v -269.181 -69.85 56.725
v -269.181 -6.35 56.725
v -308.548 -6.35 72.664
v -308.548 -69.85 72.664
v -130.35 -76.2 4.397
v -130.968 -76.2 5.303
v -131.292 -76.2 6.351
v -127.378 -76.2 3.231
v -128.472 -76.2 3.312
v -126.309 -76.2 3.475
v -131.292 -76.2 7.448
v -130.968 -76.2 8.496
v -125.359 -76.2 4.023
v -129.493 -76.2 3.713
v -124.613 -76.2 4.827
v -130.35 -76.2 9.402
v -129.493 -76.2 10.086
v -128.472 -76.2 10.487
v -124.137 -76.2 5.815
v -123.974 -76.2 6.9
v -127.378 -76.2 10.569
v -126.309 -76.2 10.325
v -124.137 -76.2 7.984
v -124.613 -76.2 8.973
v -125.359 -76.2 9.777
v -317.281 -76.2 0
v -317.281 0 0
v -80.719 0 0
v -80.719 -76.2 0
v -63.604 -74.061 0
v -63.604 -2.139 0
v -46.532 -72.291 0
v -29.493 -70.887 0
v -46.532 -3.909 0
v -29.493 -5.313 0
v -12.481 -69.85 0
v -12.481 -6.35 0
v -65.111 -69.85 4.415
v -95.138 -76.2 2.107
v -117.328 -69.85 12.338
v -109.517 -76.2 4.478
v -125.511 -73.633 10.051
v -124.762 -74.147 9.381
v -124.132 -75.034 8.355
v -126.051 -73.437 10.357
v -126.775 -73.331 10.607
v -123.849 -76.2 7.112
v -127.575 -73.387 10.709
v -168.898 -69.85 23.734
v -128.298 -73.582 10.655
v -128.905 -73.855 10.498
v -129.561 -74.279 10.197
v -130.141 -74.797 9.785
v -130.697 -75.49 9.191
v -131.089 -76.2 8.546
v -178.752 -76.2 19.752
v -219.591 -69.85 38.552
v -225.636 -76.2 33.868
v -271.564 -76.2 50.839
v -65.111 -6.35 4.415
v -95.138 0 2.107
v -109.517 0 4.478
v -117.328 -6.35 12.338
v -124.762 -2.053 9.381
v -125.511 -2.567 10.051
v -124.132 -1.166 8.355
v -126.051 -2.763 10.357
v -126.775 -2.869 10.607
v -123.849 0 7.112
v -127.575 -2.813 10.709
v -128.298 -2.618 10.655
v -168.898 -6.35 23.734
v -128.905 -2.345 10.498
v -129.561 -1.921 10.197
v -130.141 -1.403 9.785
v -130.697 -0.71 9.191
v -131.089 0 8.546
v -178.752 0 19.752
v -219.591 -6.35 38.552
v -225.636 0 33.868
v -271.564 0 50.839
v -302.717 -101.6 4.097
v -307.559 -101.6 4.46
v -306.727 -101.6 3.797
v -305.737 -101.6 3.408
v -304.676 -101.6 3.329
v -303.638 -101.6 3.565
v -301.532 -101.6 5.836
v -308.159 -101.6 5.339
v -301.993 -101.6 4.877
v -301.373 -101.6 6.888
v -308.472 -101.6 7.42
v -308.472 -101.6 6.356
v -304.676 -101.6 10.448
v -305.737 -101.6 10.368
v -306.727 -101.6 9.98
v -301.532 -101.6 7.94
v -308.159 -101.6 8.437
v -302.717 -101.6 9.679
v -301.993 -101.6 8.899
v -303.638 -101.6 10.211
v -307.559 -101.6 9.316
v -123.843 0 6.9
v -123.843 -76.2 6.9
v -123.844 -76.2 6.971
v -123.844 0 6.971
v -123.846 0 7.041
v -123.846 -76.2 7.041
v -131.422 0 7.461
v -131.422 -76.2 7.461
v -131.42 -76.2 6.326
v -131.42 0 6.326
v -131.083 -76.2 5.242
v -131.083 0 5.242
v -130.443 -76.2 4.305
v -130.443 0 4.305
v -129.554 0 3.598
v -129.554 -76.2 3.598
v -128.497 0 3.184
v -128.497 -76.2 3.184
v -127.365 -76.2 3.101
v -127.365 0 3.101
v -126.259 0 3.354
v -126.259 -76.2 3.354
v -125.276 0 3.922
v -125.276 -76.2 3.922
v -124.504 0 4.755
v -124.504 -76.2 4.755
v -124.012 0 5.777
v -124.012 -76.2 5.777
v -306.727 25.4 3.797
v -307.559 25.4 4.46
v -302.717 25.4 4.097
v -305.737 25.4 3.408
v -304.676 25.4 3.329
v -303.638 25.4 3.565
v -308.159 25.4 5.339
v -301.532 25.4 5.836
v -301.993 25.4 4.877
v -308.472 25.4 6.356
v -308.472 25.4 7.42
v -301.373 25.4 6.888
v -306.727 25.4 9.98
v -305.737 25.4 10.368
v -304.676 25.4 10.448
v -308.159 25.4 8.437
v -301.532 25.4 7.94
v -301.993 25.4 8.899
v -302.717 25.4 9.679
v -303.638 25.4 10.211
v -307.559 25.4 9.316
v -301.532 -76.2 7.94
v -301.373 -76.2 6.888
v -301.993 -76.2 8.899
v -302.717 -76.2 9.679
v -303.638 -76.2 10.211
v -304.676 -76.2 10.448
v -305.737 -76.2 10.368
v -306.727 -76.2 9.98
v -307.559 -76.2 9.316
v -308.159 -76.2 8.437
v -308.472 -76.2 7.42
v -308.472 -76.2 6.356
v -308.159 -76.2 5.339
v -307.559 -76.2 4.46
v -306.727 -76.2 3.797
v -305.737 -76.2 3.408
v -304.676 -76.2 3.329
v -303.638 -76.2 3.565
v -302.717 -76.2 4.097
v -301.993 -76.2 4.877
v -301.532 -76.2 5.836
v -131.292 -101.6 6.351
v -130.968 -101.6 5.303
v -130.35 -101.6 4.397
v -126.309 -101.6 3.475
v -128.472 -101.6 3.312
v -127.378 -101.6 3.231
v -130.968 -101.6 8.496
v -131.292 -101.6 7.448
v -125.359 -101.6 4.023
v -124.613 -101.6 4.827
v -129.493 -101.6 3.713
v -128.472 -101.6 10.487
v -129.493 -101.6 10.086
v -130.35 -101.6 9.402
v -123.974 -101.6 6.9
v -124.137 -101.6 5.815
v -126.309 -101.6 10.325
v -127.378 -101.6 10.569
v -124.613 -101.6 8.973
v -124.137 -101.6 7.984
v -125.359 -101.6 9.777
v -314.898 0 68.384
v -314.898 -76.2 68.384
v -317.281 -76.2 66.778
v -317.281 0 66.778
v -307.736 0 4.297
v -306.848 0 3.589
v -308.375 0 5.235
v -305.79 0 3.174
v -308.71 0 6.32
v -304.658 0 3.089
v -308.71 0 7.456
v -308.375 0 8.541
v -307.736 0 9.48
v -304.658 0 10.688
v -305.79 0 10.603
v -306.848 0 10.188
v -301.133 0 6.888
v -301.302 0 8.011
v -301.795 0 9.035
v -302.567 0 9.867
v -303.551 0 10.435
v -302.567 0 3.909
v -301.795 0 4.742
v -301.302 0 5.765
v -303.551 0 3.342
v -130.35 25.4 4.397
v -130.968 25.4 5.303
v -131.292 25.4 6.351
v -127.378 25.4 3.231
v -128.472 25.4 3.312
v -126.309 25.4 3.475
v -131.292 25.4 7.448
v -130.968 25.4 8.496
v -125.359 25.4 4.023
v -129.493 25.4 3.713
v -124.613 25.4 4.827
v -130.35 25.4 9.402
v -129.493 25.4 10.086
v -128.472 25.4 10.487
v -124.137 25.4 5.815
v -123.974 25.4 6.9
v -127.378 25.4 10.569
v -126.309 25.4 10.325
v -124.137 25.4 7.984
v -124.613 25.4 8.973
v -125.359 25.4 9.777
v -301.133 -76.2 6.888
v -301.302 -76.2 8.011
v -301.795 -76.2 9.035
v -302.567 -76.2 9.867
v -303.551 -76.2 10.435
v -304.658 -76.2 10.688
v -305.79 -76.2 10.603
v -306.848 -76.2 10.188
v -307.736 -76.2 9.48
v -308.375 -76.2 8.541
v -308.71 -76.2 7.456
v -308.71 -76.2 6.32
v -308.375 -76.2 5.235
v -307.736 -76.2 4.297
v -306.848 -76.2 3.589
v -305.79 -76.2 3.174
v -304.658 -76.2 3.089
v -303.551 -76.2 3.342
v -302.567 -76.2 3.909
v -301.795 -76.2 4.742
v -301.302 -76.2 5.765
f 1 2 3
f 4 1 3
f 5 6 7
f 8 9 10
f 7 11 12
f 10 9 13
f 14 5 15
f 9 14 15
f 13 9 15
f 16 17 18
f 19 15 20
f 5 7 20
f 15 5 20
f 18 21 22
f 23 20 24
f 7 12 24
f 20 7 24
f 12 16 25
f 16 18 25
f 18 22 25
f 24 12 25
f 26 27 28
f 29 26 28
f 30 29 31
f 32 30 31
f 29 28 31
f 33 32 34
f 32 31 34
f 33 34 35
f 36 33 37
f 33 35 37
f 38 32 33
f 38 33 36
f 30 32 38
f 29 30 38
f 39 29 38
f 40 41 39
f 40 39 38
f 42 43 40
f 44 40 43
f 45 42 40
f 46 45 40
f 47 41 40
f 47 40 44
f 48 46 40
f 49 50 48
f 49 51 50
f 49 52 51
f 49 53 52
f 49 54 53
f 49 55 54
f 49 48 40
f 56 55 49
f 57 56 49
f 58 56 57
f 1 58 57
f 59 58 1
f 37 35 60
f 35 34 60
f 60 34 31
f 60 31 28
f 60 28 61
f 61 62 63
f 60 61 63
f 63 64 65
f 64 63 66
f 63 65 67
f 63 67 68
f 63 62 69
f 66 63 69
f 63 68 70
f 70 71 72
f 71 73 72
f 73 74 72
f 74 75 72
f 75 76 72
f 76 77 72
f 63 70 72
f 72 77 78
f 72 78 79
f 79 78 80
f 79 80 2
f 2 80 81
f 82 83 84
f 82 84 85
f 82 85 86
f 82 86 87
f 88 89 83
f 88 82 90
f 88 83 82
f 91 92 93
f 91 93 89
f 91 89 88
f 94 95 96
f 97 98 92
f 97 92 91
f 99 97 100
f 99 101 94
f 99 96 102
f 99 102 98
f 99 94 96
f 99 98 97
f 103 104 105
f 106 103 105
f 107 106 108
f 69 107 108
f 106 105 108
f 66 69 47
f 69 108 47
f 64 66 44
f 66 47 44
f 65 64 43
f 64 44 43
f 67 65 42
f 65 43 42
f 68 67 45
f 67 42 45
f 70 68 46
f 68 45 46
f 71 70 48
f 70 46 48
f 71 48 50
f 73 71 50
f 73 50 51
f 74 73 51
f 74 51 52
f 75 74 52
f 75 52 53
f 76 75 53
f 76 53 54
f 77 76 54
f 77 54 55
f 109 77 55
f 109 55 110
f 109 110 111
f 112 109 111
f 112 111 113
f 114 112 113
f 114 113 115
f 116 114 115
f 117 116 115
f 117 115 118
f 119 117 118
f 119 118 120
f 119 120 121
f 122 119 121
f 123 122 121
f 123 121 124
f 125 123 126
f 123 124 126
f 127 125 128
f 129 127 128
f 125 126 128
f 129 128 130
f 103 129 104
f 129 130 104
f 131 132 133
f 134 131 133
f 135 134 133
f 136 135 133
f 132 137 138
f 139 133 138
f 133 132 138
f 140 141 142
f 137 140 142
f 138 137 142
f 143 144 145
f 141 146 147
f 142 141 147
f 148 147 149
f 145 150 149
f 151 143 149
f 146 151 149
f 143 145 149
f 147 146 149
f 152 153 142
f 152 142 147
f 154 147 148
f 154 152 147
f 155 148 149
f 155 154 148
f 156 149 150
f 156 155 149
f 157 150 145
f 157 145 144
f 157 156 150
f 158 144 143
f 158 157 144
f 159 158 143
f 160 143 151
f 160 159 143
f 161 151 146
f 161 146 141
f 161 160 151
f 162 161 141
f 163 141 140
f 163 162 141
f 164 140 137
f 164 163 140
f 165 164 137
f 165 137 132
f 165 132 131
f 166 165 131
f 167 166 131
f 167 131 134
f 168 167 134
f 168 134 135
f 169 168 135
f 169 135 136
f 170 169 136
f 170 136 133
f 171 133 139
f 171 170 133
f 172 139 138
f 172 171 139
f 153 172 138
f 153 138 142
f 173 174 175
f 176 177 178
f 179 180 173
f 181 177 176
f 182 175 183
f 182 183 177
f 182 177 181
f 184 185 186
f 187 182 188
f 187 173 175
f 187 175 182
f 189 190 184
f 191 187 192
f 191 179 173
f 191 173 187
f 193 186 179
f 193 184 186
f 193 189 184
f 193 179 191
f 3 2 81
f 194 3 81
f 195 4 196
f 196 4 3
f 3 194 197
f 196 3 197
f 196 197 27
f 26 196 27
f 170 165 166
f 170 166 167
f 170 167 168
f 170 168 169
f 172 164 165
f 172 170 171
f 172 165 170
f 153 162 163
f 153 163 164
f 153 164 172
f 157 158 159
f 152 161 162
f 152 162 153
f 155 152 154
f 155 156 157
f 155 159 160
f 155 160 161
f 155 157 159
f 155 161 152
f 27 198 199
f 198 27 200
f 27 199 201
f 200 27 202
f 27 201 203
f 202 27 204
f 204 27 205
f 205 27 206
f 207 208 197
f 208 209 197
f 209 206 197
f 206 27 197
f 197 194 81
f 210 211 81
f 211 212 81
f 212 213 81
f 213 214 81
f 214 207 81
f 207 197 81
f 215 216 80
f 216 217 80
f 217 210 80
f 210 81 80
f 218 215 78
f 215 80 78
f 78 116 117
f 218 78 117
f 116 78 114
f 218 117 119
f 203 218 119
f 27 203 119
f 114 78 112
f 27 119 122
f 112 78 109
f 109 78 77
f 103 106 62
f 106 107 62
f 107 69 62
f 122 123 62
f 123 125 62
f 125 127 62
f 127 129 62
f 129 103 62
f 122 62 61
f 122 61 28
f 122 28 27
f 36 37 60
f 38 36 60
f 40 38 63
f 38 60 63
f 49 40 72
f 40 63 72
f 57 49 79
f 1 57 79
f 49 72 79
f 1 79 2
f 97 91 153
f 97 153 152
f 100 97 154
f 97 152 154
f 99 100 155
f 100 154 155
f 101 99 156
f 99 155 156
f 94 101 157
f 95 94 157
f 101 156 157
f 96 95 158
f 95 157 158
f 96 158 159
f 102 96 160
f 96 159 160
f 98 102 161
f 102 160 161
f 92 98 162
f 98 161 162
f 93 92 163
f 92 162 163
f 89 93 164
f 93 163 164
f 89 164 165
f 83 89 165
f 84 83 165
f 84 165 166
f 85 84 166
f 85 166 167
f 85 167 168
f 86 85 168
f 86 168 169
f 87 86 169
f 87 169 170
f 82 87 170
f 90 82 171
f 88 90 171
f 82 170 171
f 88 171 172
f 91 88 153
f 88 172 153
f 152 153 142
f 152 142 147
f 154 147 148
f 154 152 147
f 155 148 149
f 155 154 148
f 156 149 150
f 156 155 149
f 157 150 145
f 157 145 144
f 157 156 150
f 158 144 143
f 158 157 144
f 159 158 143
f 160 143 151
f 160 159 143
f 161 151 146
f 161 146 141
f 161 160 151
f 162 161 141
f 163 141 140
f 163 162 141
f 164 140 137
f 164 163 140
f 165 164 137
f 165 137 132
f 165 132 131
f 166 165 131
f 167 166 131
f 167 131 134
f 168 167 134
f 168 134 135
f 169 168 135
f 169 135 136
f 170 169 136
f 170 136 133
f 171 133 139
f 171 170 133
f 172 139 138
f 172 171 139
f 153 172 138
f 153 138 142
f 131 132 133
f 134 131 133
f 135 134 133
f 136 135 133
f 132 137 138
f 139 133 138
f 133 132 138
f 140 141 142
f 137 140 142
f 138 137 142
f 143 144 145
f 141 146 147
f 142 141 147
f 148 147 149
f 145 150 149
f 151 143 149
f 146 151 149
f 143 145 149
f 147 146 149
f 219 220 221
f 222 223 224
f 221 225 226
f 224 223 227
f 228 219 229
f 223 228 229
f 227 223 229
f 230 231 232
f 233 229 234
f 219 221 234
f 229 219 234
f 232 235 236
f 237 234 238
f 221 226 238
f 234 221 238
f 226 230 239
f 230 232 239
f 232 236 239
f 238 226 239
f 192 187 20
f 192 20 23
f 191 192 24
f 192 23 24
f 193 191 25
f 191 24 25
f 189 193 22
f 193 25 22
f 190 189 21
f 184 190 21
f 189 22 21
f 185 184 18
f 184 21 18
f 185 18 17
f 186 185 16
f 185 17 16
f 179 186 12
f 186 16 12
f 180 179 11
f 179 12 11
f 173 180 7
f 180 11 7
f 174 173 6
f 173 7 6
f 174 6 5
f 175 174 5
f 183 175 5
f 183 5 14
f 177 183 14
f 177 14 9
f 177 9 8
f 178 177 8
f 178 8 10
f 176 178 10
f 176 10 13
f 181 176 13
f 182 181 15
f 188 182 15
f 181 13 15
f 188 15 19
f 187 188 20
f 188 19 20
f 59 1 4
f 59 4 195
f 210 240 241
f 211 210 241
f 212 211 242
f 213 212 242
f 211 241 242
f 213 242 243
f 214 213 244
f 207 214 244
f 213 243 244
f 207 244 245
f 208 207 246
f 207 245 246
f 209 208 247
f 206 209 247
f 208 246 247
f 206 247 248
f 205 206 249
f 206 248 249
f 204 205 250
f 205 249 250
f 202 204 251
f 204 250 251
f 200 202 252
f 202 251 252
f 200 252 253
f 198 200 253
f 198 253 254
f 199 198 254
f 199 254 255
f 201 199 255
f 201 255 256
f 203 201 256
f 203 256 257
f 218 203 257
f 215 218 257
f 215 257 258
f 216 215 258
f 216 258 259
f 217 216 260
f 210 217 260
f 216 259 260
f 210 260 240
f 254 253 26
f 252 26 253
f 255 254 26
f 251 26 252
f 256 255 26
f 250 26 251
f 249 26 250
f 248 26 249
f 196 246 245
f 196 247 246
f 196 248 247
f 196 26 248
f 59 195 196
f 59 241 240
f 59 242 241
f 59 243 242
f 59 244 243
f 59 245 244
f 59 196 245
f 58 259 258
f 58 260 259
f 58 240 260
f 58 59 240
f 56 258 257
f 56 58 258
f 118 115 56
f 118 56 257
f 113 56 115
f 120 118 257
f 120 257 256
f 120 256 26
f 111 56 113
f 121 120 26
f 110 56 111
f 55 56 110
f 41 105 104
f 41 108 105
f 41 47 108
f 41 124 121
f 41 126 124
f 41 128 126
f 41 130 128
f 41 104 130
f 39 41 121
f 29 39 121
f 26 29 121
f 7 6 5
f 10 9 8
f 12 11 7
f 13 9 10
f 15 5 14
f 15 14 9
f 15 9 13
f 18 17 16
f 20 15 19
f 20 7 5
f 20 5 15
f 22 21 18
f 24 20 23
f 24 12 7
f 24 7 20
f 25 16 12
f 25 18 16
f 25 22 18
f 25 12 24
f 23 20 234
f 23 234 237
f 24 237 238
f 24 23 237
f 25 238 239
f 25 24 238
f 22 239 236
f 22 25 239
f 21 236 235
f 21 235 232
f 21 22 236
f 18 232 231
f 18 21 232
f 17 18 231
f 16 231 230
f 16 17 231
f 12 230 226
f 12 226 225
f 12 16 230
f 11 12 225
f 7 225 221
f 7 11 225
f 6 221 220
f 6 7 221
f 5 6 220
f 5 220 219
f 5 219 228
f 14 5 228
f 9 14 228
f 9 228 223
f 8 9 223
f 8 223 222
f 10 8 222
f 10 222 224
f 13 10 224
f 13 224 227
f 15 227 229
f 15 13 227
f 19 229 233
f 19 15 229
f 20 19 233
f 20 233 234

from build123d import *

# Parameters (mm, degrees)
F1_DEPTH    = 76.2
F2_R        = 3.81
F3_DEPTH    = 76.2
F4_T1_DEPTH = 68.223556095
F4_T3_DEPTH = 124.0305188657
F4_T6_ANGLE = 20.3486989559
F4_T8_ANGLE = 20.3486989559
F5_R        = 3.5695769538
F6_DEPTH    = 101.6
F5_R_2      = 3.6795438925
F6_FACE_R   = 3.5695769538
F7_DEPTH    = 25.4
F8_DEPTH    = 101.6


# Not quite as in the source:
# - a fillet or chamfer that OpenCascade refuses, or shapes differently, is made with other operations: its cross-section is extruded or revolved along the edge and cut away or added


with BuildPart() as f1:
    # F0 (on Front) → F1 (new body)
    with BuildSketch(Plane.XZ):
        with BuildLine():
            Line((-317.2810375895, 0), (-12.4810375895, 0))
            ThreePointArc((-12.4810375895, 0), (-143.2080739486, 17.6048536016), (-269.1808342934, 56.7245744169))
            Line((-269.1808342934, 56.7245744169), (-317.2810375895, 76.2))
            Line((-317.2810375895, 76.2), (-317.2810375895, 0))
        make_face()
    extrude(amount=F1_DEPTH)

    # F2 (on face) → F3 (cut)
    with BuildSketch(Plane.XZ.offset(76.2)):
        with Locations((-304.942605689, 6.888254699)):
            Circle(F2_R)
        with Locations((-127.6531666517, 6.8997577764)):
            Circle(F2_R)
    extrude(amount=-F3_DEPTH, mode=Mode.SUBTRACT)

    # F4: chamfer of 6.35 on 5 edges, made by hand

    # F4_s2 → F4_t1 (cut)
    with BuildSketch(Plane(origin=(-250.9997630926, 0, 101.6279947383), x_dir=(0, 1, 0), z_dir=(-0.9269046144, 0, 0.3752969968))):
        Polygon((-6.35, 48.4444889184), (0, 54.7944889184), (0, 48.4444889184), align=None)
        Polygon((-69.85, 48.4444889184), (-76.2, 54.7944889184), (-76.2, 48.4444889184), align=None)
    extrude(amount=F4_T1_DEPTH, mode=Mode.SUBTRACT)

    # F4_s4 → F4_t3 (cut)
    with BuildSketch(Plane.XZ.offset(-23.9152594329)):
        Polygon((-308.5479016601, 72.6640162152), (-317.2810375895, 66.7781719137), (-317.2810375895, 76.2), align=None)
    extrude(amount=F4_T3_DEPTH, mode=Mode.SUBTRACT)

    # F4_s5 → F4_t6 (revolve, cut)
    with BuildSketch(Plane(origin=(3.8520530857, 0, -0.1139205939), x_dir=(0, 1, 0), z_dir=(0.9995629761, 0, -0.0295610692))):
        Polygon((-69.85, -0.5378053162), (-76.2, -6.8878053162), (-76.2, -0.5378053162), align=None)
    revolve(axis=Axis((27.1796188092, -76.2, 788.6725353144), (0, 1, 0)), revolution_arc=F4_T6_ANGLE, mode=Mode.SUBTRACT)

    # F4_s7 → F4_t8 (revolve, cut)
    with BuildSketch(Plane(origin=(3.8520530857, 0, -0.1139205939), x_dir=(0, 1, 0), z_dir=(0.9995629761, 0, -0.0295610692))):
        Polygon((-6.35, -0.5378053162), (0, -6.8878053162), (0, -0.5378053162), align=None)
    revolve(axis=Axis((27.1796188092, 0, 788.6725353144), (0, 1, 0)), revolution_arc=F4_T8_ANGLE, mode=Mode.SUBTRACT)


with BuildPart() as f6:
    # F5 (on face) → F6 (new body)
    with BuildSketch(Plane.XZ.offset(76.2)):
        with Locations((-304.942605689, 6.888254699)):
            Circle(F5_R)
    extrude(amount=-F6_DEPTH)

    # F5 (on face) + F6_face (on face) → F7 (join)
    with BuildSketch(Plane.XZ.offset(76.2)):
        with Locations((-304.942605689, 6.888254699)):
            Circle(F5_R)
        with Locations((-127.6531666517, 6.8997577764)):
            Circle(F5_R_2)
    with BuildSketch(Plane(origin=(-304.942605689, -76.2, 6.888254699), x_dir=(1, 0, 0), z_dir=(0, -1, 0))):
        Circle(F6_FACE_R)
    extrude(amount=F7_DEPTH)


with BuildPart() as f8:
    # F5 (on face) → F8 (new body)
    with BuildSketch(Plane.XZ.offset(76.2)):
        with Locations((-304.942605689, 6.888254699)):
            Circle(F5_R)
    extrude(amount=-F8_DEPTH)


with BuildPart() as f8b:
    # F5 (on face) → F8, piece 2 (new body)
    with BuildSketch(Plane.XZ.offset(76.2)):
        with Locations((-127.6531666517, 6.8997577764)):
            Circle(F5_R_2)
    extrude(amount=-F8_DEPTH)


solid = Compound([f1.part, f6.part, f8.part, f8b.part])
